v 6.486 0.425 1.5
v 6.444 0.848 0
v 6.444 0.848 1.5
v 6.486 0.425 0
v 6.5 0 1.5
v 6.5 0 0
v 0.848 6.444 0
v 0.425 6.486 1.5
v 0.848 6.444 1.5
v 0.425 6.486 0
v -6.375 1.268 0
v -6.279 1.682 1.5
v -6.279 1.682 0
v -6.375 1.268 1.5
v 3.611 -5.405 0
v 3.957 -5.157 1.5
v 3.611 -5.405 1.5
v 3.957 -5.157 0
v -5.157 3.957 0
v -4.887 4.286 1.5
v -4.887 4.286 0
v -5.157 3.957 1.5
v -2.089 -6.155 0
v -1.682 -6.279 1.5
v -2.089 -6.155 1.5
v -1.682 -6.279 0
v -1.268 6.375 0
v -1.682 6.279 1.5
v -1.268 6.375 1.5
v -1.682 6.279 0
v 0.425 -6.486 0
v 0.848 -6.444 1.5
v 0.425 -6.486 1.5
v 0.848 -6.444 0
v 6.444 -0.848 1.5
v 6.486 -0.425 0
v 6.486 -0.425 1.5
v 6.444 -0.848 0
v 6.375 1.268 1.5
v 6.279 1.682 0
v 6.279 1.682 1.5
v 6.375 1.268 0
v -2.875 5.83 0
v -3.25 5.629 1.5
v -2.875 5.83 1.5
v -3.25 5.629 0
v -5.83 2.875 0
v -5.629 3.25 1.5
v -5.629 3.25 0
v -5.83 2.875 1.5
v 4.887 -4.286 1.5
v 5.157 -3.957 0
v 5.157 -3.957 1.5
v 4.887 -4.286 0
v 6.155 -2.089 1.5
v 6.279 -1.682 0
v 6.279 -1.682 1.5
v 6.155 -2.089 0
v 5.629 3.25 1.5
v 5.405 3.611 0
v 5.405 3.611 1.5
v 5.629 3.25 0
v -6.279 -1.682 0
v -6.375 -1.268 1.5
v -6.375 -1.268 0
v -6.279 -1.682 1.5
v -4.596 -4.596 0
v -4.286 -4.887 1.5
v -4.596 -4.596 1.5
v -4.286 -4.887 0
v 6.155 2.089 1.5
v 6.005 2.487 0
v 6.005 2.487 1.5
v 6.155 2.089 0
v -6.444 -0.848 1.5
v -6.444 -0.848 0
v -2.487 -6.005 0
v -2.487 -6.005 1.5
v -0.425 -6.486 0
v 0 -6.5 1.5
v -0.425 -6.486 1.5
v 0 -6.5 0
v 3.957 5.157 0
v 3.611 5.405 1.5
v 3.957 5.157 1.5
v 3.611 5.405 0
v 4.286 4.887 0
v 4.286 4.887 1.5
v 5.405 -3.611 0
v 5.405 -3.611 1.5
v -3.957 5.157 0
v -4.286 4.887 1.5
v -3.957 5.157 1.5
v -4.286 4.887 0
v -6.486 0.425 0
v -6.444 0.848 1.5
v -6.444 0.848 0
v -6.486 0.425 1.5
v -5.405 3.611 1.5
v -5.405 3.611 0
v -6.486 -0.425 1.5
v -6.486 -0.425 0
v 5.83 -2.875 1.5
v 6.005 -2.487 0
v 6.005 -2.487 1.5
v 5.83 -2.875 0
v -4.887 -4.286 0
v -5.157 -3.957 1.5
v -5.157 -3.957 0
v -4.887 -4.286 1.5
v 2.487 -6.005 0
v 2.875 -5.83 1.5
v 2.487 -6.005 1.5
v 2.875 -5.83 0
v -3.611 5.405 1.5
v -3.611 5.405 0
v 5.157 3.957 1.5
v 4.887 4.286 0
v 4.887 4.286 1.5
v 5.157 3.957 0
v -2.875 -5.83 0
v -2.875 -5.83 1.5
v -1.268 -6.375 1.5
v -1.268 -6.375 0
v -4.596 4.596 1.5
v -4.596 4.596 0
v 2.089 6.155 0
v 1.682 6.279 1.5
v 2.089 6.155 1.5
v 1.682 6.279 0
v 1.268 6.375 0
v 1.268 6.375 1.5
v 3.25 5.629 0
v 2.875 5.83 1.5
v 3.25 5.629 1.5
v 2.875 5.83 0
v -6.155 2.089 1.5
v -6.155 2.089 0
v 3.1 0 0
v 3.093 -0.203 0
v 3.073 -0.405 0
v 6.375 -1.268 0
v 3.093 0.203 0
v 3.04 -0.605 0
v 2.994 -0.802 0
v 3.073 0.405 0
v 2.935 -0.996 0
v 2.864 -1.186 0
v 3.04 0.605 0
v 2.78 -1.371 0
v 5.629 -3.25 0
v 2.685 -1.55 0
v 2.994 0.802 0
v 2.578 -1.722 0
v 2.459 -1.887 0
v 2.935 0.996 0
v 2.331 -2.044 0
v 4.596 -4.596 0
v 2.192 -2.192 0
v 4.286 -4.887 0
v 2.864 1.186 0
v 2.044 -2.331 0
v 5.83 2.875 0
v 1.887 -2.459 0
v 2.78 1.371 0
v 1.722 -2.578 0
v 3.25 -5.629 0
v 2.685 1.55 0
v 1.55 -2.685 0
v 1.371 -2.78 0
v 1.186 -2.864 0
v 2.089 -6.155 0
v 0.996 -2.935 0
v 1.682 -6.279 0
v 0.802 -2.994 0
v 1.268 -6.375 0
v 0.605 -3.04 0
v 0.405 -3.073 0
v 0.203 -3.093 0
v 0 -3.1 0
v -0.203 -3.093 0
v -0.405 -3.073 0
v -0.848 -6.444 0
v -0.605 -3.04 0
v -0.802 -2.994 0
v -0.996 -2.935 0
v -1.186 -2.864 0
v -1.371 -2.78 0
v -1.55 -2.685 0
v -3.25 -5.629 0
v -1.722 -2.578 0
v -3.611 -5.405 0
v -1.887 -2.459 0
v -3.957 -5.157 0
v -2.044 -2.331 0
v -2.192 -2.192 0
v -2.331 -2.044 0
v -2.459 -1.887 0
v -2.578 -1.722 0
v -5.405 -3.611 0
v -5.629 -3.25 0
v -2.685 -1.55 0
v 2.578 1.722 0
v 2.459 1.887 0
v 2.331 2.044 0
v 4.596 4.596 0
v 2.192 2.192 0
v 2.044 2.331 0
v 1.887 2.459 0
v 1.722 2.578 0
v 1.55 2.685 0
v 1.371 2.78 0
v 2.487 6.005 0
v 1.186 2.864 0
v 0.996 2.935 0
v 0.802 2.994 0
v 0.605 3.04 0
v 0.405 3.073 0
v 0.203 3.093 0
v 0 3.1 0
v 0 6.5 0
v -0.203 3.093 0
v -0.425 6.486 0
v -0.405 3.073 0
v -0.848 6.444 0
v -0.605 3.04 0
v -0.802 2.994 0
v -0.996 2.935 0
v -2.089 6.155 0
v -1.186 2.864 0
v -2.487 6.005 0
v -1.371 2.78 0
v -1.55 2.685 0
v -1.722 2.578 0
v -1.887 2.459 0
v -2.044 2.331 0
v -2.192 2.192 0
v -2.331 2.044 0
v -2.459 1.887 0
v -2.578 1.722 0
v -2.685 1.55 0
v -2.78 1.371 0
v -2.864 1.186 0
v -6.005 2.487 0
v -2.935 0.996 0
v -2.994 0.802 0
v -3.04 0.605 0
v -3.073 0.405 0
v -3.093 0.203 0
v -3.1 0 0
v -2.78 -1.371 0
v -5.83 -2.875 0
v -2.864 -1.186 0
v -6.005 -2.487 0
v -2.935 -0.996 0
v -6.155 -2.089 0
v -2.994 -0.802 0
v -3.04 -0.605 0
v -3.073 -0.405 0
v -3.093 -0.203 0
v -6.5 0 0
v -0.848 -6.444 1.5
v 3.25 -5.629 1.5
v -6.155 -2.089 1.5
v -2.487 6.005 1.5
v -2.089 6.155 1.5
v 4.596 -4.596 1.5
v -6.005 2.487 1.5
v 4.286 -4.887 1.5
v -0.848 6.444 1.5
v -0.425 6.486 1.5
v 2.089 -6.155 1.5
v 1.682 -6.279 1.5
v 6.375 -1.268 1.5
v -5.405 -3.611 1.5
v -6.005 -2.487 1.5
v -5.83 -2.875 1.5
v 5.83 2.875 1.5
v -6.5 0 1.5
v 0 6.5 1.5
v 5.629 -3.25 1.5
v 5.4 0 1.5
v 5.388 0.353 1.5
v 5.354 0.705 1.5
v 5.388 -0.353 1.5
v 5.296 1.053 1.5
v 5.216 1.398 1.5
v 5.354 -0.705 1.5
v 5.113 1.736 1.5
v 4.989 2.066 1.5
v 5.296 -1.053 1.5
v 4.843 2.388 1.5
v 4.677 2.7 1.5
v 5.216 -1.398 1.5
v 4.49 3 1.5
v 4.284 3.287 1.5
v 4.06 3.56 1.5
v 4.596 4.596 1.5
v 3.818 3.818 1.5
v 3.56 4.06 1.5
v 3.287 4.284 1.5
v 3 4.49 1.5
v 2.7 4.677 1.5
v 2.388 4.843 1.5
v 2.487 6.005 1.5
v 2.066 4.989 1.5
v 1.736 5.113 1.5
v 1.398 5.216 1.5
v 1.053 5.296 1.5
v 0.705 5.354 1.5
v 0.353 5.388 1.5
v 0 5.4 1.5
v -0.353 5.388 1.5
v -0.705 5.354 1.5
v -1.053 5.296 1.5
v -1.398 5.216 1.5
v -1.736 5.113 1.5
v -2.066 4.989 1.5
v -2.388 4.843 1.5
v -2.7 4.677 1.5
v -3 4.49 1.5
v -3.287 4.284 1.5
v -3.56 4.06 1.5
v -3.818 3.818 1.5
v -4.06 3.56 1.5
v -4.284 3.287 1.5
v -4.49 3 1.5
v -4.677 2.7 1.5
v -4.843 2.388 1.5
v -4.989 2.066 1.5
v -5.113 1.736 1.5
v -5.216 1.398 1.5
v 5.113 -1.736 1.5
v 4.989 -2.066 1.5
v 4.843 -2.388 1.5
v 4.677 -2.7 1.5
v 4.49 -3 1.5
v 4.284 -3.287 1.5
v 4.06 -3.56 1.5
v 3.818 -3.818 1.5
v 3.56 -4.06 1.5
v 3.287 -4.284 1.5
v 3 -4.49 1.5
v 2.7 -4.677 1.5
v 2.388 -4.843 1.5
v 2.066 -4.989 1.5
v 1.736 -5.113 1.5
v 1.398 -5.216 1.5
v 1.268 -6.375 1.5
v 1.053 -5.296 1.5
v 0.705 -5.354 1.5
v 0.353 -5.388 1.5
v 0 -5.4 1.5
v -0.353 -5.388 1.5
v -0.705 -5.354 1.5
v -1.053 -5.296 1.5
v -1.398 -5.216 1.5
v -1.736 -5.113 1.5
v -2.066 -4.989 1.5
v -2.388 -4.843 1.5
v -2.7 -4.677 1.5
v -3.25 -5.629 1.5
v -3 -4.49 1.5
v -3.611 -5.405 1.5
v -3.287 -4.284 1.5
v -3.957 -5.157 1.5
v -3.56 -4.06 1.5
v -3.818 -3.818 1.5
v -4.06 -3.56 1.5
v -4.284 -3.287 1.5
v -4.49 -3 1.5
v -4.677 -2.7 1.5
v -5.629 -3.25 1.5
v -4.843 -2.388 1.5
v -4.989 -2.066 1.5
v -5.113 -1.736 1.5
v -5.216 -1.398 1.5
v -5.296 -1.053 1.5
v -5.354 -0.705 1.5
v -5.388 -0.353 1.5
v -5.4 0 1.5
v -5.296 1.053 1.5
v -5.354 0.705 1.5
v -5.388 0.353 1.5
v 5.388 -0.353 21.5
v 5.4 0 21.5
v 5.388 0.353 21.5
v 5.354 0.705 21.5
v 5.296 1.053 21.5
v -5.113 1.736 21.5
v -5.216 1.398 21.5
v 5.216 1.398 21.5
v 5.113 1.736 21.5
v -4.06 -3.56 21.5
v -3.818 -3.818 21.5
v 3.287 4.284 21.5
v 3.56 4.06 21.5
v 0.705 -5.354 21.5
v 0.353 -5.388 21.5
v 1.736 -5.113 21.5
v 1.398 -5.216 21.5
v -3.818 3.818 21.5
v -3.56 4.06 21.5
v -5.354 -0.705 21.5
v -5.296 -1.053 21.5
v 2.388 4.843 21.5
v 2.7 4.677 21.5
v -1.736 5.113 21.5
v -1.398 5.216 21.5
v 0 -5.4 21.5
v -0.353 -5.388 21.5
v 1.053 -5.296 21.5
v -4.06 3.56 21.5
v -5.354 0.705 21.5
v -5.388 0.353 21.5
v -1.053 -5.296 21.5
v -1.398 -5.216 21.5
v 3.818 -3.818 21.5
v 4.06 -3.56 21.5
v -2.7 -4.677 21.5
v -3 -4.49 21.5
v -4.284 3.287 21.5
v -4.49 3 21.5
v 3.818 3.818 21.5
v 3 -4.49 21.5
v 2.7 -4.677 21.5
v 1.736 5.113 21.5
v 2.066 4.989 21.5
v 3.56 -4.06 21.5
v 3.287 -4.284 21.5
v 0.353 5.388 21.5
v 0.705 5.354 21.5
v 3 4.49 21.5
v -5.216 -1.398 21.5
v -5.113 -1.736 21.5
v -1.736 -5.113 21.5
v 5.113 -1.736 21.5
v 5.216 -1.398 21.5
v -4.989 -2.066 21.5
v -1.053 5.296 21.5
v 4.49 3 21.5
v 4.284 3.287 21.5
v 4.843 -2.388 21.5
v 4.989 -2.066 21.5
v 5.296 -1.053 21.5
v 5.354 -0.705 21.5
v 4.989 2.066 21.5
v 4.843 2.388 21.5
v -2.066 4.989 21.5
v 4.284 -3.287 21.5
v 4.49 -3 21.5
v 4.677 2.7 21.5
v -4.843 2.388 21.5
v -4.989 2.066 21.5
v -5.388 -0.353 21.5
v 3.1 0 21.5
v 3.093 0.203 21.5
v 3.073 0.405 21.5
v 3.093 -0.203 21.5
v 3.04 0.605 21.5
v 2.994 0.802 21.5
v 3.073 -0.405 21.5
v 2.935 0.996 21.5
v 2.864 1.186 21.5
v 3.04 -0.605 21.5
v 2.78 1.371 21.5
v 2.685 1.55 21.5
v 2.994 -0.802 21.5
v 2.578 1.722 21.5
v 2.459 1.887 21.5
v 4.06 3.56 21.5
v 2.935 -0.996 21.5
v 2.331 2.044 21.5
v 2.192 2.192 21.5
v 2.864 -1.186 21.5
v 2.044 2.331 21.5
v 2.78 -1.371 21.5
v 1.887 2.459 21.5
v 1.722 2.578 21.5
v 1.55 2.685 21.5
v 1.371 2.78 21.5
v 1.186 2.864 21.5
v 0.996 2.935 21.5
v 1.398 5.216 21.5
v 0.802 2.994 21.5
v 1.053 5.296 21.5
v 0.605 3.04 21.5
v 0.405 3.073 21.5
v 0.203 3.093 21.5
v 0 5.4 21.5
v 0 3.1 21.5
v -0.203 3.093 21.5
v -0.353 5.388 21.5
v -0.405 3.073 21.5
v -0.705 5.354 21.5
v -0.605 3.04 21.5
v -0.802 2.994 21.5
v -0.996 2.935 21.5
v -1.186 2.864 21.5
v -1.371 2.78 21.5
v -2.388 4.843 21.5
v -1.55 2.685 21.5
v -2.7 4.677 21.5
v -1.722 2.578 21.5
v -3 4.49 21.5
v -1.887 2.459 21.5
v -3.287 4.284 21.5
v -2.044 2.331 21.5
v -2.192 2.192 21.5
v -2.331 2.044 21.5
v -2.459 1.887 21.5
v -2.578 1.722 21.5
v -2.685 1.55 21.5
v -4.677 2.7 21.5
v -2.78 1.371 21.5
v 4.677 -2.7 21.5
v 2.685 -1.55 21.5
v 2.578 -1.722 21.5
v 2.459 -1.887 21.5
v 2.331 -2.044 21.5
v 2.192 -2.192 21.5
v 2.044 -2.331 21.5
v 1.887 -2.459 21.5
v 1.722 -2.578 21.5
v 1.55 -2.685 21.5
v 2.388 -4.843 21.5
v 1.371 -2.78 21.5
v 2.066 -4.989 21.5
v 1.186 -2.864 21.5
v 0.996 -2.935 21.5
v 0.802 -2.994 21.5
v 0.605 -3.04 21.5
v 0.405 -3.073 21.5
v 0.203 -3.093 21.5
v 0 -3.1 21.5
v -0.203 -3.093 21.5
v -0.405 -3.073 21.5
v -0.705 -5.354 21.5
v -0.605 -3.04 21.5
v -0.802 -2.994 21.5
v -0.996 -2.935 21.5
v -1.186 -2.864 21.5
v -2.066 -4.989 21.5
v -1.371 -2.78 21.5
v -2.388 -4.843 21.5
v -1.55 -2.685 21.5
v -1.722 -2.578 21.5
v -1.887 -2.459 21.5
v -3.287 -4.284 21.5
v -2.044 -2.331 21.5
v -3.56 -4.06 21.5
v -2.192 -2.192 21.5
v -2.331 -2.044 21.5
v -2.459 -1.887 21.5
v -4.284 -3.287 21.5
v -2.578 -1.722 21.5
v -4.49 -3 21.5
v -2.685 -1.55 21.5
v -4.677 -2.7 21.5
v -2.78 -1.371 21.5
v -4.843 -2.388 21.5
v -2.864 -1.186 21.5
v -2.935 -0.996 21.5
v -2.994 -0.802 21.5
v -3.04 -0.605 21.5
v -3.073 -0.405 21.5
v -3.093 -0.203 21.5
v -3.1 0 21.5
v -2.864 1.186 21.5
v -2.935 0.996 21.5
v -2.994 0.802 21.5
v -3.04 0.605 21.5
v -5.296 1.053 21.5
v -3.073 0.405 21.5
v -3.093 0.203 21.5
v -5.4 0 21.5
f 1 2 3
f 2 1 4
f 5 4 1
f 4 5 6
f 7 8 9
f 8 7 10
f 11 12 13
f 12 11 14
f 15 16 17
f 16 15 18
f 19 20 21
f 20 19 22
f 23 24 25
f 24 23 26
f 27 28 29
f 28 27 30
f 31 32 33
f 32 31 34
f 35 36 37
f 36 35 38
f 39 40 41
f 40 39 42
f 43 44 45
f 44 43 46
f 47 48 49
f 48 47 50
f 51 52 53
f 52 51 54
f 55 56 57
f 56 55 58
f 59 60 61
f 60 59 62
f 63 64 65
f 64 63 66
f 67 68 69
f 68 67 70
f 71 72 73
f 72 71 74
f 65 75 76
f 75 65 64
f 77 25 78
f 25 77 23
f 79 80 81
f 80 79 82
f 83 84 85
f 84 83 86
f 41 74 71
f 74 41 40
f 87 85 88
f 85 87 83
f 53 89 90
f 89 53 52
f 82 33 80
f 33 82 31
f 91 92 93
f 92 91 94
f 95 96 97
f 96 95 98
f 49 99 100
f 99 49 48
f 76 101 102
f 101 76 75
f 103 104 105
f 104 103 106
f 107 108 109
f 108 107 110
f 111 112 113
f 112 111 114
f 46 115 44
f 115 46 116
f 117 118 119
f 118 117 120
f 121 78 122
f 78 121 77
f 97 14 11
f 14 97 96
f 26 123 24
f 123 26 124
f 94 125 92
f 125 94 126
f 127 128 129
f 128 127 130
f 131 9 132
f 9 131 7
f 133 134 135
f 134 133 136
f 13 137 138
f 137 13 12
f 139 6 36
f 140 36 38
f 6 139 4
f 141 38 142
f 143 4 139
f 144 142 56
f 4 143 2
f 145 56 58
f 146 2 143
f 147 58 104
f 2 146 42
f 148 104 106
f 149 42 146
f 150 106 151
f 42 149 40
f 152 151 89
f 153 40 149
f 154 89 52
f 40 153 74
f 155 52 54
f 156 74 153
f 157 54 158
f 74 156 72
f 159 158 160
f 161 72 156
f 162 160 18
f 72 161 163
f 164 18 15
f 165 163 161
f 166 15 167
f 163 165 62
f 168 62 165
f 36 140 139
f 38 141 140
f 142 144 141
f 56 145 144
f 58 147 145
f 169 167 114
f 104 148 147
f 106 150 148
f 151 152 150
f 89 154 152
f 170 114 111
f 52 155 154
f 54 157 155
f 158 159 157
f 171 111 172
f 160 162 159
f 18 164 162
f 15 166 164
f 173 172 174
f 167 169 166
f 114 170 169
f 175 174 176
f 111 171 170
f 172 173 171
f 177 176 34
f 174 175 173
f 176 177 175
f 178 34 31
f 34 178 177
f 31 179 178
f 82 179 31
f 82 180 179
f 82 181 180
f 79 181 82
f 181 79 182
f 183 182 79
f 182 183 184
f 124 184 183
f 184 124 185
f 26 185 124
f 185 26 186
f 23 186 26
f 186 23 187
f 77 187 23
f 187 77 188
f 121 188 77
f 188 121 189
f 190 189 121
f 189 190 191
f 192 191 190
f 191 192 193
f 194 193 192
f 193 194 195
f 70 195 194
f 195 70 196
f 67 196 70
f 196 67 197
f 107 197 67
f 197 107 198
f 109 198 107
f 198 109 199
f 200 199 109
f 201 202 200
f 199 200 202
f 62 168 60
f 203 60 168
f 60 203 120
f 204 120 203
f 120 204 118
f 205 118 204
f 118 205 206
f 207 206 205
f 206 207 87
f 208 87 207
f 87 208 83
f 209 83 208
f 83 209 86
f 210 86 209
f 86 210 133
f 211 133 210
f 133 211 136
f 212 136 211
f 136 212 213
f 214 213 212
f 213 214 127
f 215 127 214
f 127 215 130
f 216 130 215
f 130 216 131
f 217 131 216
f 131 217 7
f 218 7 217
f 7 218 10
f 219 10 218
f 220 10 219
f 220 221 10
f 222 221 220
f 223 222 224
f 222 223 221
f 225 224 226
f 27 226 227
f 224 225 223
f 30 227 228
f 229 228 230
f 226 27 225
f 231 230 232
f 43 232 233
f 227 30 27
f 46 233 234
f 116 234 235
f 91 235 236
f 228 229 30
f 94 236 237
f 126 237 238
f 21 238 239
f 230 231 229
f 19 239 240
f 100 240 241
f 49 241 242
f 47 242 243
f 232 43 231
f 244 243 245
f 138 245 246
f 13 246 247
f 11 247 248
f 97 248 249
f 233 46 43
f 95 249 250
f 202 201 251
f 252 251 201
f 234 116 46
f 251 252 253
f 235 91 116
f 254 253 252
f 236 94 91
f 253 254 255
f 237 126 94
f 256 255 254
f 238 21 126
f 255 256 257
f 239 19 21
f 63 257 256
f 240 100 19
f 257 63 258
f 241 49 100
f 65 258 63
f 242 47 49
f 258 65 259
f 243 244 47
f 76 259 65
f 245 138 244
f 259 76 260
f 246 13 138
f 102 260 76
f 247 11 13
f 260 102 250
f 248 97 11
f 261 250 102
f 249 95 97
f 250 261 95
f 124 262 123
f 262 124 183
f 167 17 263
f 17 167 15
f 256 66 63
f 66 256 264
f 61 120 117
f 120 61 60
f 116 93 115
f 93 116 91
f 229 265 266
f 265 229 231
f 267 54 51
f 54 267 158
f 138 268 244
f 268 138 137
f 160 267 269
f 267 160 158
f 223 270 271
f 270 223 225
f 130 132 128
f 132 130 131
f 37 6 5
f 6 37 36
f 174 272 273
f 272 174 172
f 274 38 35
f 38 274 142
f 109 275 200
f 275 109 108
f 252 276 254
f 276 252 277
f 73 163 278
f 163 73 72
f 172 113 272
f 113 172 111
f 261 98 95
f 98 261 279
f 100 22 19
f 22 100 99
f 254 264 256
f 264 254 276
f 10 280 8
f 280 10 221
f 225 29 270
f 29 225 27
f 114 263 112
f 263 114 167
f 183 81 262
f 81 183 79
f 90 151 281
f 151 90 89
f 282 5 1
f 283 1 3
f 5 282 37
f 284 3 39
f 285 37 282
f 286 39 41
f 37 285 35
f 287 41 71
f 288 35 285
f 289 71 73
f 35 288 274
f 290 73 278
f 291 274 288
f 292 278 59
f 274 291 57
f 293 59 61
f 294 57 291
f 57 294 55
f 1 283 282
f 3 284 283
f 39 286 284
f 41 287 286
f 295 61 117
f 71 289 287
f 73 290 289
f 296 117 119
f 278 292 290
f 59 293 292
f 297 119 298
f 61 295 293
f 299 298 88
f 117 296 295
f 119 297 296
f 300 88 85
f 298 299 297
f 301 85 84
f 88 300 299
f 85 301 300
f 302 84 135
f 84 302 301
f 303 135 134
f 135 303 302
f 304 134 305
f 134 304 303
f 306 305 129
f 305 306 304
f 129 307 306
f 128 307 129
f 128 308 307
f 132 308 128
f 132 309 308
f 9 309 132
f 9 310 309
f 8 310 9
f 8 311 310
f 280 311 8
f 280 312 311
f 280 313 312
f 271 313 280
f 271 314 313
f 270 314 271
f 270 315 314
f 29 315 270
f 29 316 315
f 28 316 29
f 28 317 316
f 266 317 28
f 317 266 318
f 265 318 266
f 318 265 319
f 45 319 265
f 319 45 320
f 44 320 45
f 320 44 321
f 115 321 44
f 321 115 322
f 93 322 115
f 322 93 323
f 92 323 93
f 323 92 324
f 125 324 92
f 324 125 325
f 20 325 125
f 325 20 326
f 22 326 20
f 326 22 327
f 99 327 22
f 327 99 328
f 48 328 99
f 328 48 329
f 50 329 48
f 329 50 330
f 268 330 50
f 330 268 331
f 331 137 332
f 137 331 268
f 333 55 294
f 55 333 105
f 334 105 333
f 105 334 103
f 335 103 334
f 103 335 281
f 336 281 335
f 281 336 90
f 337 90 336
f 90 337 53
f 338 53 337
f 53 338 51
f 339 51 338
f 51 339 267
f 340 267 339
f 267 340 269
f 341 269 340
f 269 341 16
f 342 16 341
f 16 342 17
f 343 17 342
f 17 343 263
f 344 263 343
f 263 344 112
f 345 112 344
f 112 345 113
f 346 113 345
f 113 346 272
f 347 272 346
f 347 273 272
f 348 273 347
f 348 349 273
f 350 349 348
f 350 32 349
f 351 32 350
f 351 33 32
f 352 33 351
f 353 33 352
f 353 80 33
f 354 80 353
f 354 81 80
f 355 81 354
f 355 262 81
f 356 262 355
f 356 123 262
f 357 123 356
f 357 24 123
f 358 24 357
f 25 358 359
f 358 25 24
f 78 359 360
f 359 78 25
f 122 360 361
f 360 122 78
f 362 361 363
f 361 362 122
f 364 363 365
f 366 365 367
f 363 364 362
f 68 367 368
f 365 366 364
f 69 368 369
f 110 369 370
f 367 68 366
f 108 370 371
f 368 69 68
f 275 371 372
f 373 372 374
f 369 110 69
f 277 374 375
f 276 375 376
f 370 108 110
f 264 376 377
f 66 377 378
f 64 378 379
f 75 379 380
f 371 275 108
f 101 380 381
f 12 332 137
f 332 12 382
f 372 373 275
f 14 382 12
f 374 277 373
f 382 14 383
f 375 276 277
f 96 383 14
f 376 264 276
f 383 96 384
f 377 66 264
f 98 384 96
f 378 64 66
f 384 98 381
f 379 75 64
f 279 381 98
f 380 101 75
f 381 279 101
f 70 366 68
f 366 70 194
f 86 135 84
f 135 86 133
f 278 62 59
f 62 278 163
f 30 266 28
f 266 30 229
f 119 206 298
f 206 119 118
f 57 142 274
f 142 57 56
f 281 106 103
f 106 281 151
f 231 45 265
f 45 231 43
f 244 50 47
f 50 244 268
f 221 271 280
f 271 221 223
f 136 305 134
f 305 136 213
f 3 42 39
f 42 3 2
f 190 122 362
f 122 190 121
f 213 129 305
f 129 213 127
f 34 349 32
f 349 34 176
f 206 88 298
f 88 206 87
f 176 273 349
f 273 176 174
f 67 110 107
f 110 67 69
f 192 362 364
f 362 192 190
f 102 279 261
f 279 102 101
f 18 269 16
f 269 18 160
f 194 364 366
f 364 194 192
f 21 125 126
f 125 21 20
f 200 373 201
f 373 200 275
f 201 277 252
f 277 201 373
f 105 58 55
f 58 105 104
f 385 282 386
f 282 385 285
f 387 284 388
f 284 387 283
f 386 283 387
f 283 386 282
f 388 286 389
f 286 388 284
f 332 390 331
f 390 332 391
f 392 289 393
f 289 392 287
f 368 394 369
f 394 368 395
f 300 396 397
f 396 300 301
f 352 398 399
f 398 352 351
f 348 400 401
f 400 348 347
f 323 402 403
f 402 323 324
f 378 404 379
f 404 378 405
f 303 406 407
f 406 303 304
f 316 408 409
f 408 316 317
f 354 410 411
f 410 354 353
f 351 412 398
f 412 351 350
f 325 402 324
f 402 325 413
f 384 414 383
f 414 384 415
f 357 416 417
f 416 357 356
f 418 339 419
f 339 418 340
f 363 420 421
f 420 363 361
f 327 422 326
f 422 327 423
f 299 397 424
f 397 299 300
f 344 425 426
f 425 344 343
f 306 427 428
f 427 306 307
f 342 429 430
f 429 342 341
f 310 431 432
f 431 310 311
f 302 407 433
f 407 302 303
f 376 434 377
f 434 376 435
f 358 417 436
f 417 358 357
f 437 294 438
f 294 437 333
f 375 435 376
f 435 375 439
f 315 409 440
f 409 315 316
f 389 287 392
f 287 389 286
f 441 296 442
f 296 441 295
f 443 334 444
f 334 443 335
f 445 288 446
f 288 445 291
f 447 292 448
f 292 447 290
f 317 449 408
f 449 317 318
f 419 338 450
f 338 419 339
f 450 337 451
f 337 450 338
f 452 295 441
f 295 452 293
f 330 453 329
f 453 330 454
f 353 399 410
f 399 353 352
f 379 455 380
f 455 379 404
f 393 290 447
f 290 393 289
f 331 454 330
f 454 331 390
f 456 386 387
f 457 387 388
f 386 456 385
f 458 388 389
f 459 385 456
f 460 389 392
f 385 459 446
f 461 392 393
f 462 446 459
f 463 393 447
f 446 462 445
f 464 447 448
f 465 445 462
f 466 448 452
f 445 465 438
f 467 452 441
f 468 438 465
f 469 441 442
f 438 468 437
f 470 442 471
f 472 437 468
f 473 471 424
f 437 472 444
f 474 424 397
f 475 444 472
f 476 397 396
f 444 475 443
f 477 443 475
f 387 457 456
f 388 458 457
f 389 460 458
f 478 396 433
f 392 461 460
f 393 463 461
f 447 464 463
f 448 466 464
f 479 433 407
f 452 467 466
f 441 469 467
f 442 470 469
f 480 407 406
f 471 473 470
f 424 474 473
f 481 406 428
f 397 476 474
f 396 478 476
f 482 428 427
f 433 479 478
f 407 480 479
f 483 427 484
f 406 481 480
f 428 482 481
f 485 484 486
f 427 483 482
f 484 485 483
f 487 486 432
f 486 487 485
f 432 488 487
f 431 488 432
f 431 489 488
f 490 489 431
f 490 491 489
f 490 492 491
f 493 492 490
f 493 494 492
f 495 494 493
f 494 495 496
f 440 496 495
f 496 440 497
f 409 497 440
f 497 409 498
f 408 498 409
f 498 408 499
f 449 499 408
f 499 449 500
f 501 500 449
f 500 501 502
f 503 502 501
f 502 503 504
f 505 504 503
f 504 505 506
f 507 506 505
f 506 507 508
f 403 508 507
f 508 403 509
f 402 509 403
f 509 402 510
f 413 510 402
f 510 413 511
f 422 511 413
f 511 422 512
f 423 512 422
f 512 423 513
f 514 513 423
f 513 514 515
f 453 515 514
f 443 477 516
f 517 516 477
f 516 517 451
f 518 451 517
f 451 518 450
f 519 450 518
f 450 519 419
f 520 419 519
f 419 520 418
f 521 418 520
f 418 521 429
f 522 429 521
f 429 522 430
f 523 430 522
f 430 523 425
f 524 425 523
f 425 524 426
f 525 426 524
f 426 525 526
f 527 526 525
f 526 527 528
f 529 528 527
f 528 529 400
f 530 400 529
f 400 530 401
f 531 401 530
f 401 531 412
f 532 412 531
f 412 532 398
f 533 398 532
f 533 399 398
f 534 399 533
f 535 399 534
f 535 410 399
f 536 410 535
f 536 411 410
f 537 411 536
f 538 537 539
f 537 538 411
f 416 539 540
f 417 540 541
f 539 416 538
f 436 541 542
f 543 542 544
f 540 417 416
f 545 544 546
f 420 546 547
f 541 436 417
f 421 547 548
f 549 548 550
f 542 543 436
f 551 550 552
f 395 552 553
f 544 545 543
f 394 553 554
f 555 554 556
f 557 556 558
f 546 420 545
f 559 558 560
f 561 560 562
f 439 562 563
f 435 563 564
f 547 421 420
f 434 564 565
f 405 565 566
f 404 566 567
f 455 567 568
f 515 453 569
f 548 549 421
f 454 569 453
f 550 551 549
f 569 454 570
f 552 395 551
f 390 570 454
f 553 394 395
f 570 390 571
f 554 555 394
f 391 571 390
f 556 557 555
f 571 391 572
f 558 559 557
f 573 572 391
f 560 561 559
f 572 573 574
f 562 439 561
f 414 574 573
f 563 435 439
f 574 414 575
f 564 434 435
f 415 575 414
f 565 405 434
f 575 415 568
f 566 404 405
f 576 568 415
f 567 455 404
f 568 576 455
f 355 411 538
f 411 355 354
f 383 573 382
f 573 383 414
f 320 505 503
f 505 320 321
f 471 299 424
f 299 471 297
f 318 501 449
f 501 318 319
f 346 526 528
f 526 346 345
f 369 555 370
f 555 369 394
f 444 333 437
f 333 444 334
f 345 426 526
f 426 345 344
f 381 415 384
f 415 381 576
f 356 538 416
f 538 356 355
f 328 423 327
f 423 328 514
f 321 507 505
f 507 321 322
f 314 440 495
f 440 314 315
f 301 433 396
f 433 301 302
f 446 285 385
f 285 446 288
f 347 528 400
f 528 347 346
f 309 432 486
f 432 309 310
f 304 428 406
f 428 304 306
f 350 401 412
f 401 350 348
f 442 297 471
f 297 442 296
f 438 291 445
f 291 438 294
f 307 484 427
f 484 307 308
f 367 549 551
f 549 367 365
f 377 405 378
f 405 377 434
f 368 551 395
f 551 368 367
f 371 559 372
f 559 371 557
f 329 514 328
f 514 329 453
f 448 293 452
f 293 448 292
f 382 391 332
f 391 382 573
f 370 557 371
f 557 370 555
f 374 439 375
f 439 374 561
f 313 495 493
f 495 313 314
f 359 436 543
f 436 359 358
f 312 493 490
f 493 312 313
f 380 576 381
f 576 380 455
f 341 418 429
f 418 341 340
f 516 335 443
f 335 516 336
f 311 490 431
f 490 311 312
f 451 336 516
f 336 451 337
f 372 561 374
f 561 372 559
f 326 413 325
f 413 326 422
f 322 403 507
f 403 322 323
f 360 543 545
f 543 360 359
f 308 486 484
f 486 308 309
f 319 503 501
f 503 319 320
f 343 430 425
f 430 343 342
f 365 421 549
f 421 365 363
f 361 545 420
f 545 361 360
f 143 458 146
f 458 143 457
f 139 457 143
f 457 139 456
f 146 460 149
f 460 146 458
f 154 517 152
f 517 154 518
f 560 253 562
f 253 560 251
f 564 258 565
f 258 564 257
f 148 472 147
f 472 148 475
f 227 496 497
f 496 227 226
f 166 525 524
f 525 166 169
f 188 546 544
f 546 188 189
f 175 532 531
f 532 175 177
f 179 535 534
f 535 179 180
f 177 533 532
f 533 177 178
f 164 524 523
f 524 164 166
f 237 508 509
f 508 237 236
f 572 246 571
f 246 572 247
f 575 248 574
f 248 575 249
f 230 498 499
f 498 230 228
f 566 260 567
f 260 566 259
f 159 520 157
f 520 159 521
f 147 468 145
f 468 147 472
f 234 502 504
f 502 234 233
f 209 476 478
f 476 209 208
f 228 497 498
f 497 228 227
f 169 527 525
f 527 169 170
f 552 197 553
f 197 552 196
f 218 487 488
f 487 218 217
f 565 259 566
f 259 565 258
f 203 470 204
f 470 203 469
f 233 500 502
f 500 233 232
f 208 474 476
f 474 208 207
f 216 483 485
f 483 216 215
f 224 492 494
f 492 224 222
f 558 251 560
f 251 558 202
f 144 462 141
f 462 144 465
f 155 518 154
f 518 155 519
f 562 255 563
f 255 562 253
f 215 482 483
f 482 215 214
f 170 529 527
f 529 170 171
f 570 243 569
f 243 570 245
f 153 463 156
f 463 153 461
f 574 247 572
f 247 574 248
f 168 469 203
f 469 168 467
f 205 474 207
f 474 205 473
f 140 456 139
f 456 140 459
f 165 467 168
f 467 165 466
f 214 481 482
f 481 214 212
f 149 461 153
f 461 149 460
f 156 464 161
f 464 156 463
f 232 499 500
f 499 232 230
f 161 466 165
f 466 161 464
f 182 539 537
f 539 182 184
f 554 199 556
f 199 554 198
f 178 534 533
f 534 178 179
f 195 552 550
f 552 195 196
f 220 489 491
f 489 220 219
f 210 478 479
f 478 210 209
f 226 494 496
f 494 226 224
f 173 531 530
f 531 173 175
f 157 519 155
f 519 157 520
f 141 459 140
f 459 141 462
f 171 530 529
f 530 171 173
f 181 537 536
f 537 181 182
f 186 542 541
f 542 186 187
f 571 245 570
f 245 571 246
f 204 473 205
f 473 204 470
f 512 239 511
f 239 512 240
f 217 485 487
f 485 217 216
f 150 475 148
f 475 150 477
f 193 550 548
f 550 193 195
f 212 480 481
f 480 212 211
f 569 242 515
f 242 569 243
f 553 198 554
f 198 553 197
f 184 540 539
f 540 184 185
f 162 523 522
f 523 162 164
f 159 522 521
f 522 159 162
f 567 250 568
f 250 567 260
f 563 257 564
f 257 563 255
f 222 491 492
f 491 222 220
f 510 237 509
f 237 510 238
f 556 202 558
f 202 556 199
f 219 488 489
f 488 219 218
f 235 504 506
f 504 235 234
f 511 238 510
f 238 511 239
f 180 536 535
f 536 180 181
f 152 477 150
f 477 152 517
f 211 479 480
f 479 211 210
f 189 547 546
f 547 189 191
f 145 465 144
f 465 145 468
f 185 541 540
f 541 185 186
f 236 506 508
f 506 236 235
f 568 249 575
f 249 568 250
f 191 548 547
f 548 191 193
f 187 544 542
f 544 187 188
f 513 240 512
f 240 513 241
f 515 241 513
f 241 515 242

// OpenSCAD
// PCR tube adapter sleeve - fits a 0.2 mL tube into a 1.5 mL rack hole
// Print orientation: collar on the bed (z = 0), sleeve body builds upward.

// ---------- Parameters ----------
collar_d        = 13;     // collar outer diameter (mm)
collar_t        = 1.5;    // collar thickness (mm)
sleeve_d        = 10.8;   // sleeve outer diameter (mm)
sleeve_h        = 20;     // sleeve body height above collar (mm)
bore_d          = 6.2;    // through-bore diameter (mm)
eps             = 0.5;    // cutter overshoot past faces (mm)

$fn = 96;

// ---------- Model ----------
total_h = collar_t + sleeve_h;   // 21.5 mm overall height

difference() {
    union() {
        // Collar: z = 0 to 1.5, centred on origin in XY
        cylinder(d = collar_d, h = collar_t);

        // Sleeve body: z = 1.5 to 21.5, centred on origin in XY
        translate([0, 0, collar_t])
            cylinder(d = sleeve_d, h = sleeve_h);
    }

    // Straight through-bore, extends past both end faces
    translate([0, 0, -eps])
        cylinder(d = bore_d, h = total_h + 2 * eps);
}
